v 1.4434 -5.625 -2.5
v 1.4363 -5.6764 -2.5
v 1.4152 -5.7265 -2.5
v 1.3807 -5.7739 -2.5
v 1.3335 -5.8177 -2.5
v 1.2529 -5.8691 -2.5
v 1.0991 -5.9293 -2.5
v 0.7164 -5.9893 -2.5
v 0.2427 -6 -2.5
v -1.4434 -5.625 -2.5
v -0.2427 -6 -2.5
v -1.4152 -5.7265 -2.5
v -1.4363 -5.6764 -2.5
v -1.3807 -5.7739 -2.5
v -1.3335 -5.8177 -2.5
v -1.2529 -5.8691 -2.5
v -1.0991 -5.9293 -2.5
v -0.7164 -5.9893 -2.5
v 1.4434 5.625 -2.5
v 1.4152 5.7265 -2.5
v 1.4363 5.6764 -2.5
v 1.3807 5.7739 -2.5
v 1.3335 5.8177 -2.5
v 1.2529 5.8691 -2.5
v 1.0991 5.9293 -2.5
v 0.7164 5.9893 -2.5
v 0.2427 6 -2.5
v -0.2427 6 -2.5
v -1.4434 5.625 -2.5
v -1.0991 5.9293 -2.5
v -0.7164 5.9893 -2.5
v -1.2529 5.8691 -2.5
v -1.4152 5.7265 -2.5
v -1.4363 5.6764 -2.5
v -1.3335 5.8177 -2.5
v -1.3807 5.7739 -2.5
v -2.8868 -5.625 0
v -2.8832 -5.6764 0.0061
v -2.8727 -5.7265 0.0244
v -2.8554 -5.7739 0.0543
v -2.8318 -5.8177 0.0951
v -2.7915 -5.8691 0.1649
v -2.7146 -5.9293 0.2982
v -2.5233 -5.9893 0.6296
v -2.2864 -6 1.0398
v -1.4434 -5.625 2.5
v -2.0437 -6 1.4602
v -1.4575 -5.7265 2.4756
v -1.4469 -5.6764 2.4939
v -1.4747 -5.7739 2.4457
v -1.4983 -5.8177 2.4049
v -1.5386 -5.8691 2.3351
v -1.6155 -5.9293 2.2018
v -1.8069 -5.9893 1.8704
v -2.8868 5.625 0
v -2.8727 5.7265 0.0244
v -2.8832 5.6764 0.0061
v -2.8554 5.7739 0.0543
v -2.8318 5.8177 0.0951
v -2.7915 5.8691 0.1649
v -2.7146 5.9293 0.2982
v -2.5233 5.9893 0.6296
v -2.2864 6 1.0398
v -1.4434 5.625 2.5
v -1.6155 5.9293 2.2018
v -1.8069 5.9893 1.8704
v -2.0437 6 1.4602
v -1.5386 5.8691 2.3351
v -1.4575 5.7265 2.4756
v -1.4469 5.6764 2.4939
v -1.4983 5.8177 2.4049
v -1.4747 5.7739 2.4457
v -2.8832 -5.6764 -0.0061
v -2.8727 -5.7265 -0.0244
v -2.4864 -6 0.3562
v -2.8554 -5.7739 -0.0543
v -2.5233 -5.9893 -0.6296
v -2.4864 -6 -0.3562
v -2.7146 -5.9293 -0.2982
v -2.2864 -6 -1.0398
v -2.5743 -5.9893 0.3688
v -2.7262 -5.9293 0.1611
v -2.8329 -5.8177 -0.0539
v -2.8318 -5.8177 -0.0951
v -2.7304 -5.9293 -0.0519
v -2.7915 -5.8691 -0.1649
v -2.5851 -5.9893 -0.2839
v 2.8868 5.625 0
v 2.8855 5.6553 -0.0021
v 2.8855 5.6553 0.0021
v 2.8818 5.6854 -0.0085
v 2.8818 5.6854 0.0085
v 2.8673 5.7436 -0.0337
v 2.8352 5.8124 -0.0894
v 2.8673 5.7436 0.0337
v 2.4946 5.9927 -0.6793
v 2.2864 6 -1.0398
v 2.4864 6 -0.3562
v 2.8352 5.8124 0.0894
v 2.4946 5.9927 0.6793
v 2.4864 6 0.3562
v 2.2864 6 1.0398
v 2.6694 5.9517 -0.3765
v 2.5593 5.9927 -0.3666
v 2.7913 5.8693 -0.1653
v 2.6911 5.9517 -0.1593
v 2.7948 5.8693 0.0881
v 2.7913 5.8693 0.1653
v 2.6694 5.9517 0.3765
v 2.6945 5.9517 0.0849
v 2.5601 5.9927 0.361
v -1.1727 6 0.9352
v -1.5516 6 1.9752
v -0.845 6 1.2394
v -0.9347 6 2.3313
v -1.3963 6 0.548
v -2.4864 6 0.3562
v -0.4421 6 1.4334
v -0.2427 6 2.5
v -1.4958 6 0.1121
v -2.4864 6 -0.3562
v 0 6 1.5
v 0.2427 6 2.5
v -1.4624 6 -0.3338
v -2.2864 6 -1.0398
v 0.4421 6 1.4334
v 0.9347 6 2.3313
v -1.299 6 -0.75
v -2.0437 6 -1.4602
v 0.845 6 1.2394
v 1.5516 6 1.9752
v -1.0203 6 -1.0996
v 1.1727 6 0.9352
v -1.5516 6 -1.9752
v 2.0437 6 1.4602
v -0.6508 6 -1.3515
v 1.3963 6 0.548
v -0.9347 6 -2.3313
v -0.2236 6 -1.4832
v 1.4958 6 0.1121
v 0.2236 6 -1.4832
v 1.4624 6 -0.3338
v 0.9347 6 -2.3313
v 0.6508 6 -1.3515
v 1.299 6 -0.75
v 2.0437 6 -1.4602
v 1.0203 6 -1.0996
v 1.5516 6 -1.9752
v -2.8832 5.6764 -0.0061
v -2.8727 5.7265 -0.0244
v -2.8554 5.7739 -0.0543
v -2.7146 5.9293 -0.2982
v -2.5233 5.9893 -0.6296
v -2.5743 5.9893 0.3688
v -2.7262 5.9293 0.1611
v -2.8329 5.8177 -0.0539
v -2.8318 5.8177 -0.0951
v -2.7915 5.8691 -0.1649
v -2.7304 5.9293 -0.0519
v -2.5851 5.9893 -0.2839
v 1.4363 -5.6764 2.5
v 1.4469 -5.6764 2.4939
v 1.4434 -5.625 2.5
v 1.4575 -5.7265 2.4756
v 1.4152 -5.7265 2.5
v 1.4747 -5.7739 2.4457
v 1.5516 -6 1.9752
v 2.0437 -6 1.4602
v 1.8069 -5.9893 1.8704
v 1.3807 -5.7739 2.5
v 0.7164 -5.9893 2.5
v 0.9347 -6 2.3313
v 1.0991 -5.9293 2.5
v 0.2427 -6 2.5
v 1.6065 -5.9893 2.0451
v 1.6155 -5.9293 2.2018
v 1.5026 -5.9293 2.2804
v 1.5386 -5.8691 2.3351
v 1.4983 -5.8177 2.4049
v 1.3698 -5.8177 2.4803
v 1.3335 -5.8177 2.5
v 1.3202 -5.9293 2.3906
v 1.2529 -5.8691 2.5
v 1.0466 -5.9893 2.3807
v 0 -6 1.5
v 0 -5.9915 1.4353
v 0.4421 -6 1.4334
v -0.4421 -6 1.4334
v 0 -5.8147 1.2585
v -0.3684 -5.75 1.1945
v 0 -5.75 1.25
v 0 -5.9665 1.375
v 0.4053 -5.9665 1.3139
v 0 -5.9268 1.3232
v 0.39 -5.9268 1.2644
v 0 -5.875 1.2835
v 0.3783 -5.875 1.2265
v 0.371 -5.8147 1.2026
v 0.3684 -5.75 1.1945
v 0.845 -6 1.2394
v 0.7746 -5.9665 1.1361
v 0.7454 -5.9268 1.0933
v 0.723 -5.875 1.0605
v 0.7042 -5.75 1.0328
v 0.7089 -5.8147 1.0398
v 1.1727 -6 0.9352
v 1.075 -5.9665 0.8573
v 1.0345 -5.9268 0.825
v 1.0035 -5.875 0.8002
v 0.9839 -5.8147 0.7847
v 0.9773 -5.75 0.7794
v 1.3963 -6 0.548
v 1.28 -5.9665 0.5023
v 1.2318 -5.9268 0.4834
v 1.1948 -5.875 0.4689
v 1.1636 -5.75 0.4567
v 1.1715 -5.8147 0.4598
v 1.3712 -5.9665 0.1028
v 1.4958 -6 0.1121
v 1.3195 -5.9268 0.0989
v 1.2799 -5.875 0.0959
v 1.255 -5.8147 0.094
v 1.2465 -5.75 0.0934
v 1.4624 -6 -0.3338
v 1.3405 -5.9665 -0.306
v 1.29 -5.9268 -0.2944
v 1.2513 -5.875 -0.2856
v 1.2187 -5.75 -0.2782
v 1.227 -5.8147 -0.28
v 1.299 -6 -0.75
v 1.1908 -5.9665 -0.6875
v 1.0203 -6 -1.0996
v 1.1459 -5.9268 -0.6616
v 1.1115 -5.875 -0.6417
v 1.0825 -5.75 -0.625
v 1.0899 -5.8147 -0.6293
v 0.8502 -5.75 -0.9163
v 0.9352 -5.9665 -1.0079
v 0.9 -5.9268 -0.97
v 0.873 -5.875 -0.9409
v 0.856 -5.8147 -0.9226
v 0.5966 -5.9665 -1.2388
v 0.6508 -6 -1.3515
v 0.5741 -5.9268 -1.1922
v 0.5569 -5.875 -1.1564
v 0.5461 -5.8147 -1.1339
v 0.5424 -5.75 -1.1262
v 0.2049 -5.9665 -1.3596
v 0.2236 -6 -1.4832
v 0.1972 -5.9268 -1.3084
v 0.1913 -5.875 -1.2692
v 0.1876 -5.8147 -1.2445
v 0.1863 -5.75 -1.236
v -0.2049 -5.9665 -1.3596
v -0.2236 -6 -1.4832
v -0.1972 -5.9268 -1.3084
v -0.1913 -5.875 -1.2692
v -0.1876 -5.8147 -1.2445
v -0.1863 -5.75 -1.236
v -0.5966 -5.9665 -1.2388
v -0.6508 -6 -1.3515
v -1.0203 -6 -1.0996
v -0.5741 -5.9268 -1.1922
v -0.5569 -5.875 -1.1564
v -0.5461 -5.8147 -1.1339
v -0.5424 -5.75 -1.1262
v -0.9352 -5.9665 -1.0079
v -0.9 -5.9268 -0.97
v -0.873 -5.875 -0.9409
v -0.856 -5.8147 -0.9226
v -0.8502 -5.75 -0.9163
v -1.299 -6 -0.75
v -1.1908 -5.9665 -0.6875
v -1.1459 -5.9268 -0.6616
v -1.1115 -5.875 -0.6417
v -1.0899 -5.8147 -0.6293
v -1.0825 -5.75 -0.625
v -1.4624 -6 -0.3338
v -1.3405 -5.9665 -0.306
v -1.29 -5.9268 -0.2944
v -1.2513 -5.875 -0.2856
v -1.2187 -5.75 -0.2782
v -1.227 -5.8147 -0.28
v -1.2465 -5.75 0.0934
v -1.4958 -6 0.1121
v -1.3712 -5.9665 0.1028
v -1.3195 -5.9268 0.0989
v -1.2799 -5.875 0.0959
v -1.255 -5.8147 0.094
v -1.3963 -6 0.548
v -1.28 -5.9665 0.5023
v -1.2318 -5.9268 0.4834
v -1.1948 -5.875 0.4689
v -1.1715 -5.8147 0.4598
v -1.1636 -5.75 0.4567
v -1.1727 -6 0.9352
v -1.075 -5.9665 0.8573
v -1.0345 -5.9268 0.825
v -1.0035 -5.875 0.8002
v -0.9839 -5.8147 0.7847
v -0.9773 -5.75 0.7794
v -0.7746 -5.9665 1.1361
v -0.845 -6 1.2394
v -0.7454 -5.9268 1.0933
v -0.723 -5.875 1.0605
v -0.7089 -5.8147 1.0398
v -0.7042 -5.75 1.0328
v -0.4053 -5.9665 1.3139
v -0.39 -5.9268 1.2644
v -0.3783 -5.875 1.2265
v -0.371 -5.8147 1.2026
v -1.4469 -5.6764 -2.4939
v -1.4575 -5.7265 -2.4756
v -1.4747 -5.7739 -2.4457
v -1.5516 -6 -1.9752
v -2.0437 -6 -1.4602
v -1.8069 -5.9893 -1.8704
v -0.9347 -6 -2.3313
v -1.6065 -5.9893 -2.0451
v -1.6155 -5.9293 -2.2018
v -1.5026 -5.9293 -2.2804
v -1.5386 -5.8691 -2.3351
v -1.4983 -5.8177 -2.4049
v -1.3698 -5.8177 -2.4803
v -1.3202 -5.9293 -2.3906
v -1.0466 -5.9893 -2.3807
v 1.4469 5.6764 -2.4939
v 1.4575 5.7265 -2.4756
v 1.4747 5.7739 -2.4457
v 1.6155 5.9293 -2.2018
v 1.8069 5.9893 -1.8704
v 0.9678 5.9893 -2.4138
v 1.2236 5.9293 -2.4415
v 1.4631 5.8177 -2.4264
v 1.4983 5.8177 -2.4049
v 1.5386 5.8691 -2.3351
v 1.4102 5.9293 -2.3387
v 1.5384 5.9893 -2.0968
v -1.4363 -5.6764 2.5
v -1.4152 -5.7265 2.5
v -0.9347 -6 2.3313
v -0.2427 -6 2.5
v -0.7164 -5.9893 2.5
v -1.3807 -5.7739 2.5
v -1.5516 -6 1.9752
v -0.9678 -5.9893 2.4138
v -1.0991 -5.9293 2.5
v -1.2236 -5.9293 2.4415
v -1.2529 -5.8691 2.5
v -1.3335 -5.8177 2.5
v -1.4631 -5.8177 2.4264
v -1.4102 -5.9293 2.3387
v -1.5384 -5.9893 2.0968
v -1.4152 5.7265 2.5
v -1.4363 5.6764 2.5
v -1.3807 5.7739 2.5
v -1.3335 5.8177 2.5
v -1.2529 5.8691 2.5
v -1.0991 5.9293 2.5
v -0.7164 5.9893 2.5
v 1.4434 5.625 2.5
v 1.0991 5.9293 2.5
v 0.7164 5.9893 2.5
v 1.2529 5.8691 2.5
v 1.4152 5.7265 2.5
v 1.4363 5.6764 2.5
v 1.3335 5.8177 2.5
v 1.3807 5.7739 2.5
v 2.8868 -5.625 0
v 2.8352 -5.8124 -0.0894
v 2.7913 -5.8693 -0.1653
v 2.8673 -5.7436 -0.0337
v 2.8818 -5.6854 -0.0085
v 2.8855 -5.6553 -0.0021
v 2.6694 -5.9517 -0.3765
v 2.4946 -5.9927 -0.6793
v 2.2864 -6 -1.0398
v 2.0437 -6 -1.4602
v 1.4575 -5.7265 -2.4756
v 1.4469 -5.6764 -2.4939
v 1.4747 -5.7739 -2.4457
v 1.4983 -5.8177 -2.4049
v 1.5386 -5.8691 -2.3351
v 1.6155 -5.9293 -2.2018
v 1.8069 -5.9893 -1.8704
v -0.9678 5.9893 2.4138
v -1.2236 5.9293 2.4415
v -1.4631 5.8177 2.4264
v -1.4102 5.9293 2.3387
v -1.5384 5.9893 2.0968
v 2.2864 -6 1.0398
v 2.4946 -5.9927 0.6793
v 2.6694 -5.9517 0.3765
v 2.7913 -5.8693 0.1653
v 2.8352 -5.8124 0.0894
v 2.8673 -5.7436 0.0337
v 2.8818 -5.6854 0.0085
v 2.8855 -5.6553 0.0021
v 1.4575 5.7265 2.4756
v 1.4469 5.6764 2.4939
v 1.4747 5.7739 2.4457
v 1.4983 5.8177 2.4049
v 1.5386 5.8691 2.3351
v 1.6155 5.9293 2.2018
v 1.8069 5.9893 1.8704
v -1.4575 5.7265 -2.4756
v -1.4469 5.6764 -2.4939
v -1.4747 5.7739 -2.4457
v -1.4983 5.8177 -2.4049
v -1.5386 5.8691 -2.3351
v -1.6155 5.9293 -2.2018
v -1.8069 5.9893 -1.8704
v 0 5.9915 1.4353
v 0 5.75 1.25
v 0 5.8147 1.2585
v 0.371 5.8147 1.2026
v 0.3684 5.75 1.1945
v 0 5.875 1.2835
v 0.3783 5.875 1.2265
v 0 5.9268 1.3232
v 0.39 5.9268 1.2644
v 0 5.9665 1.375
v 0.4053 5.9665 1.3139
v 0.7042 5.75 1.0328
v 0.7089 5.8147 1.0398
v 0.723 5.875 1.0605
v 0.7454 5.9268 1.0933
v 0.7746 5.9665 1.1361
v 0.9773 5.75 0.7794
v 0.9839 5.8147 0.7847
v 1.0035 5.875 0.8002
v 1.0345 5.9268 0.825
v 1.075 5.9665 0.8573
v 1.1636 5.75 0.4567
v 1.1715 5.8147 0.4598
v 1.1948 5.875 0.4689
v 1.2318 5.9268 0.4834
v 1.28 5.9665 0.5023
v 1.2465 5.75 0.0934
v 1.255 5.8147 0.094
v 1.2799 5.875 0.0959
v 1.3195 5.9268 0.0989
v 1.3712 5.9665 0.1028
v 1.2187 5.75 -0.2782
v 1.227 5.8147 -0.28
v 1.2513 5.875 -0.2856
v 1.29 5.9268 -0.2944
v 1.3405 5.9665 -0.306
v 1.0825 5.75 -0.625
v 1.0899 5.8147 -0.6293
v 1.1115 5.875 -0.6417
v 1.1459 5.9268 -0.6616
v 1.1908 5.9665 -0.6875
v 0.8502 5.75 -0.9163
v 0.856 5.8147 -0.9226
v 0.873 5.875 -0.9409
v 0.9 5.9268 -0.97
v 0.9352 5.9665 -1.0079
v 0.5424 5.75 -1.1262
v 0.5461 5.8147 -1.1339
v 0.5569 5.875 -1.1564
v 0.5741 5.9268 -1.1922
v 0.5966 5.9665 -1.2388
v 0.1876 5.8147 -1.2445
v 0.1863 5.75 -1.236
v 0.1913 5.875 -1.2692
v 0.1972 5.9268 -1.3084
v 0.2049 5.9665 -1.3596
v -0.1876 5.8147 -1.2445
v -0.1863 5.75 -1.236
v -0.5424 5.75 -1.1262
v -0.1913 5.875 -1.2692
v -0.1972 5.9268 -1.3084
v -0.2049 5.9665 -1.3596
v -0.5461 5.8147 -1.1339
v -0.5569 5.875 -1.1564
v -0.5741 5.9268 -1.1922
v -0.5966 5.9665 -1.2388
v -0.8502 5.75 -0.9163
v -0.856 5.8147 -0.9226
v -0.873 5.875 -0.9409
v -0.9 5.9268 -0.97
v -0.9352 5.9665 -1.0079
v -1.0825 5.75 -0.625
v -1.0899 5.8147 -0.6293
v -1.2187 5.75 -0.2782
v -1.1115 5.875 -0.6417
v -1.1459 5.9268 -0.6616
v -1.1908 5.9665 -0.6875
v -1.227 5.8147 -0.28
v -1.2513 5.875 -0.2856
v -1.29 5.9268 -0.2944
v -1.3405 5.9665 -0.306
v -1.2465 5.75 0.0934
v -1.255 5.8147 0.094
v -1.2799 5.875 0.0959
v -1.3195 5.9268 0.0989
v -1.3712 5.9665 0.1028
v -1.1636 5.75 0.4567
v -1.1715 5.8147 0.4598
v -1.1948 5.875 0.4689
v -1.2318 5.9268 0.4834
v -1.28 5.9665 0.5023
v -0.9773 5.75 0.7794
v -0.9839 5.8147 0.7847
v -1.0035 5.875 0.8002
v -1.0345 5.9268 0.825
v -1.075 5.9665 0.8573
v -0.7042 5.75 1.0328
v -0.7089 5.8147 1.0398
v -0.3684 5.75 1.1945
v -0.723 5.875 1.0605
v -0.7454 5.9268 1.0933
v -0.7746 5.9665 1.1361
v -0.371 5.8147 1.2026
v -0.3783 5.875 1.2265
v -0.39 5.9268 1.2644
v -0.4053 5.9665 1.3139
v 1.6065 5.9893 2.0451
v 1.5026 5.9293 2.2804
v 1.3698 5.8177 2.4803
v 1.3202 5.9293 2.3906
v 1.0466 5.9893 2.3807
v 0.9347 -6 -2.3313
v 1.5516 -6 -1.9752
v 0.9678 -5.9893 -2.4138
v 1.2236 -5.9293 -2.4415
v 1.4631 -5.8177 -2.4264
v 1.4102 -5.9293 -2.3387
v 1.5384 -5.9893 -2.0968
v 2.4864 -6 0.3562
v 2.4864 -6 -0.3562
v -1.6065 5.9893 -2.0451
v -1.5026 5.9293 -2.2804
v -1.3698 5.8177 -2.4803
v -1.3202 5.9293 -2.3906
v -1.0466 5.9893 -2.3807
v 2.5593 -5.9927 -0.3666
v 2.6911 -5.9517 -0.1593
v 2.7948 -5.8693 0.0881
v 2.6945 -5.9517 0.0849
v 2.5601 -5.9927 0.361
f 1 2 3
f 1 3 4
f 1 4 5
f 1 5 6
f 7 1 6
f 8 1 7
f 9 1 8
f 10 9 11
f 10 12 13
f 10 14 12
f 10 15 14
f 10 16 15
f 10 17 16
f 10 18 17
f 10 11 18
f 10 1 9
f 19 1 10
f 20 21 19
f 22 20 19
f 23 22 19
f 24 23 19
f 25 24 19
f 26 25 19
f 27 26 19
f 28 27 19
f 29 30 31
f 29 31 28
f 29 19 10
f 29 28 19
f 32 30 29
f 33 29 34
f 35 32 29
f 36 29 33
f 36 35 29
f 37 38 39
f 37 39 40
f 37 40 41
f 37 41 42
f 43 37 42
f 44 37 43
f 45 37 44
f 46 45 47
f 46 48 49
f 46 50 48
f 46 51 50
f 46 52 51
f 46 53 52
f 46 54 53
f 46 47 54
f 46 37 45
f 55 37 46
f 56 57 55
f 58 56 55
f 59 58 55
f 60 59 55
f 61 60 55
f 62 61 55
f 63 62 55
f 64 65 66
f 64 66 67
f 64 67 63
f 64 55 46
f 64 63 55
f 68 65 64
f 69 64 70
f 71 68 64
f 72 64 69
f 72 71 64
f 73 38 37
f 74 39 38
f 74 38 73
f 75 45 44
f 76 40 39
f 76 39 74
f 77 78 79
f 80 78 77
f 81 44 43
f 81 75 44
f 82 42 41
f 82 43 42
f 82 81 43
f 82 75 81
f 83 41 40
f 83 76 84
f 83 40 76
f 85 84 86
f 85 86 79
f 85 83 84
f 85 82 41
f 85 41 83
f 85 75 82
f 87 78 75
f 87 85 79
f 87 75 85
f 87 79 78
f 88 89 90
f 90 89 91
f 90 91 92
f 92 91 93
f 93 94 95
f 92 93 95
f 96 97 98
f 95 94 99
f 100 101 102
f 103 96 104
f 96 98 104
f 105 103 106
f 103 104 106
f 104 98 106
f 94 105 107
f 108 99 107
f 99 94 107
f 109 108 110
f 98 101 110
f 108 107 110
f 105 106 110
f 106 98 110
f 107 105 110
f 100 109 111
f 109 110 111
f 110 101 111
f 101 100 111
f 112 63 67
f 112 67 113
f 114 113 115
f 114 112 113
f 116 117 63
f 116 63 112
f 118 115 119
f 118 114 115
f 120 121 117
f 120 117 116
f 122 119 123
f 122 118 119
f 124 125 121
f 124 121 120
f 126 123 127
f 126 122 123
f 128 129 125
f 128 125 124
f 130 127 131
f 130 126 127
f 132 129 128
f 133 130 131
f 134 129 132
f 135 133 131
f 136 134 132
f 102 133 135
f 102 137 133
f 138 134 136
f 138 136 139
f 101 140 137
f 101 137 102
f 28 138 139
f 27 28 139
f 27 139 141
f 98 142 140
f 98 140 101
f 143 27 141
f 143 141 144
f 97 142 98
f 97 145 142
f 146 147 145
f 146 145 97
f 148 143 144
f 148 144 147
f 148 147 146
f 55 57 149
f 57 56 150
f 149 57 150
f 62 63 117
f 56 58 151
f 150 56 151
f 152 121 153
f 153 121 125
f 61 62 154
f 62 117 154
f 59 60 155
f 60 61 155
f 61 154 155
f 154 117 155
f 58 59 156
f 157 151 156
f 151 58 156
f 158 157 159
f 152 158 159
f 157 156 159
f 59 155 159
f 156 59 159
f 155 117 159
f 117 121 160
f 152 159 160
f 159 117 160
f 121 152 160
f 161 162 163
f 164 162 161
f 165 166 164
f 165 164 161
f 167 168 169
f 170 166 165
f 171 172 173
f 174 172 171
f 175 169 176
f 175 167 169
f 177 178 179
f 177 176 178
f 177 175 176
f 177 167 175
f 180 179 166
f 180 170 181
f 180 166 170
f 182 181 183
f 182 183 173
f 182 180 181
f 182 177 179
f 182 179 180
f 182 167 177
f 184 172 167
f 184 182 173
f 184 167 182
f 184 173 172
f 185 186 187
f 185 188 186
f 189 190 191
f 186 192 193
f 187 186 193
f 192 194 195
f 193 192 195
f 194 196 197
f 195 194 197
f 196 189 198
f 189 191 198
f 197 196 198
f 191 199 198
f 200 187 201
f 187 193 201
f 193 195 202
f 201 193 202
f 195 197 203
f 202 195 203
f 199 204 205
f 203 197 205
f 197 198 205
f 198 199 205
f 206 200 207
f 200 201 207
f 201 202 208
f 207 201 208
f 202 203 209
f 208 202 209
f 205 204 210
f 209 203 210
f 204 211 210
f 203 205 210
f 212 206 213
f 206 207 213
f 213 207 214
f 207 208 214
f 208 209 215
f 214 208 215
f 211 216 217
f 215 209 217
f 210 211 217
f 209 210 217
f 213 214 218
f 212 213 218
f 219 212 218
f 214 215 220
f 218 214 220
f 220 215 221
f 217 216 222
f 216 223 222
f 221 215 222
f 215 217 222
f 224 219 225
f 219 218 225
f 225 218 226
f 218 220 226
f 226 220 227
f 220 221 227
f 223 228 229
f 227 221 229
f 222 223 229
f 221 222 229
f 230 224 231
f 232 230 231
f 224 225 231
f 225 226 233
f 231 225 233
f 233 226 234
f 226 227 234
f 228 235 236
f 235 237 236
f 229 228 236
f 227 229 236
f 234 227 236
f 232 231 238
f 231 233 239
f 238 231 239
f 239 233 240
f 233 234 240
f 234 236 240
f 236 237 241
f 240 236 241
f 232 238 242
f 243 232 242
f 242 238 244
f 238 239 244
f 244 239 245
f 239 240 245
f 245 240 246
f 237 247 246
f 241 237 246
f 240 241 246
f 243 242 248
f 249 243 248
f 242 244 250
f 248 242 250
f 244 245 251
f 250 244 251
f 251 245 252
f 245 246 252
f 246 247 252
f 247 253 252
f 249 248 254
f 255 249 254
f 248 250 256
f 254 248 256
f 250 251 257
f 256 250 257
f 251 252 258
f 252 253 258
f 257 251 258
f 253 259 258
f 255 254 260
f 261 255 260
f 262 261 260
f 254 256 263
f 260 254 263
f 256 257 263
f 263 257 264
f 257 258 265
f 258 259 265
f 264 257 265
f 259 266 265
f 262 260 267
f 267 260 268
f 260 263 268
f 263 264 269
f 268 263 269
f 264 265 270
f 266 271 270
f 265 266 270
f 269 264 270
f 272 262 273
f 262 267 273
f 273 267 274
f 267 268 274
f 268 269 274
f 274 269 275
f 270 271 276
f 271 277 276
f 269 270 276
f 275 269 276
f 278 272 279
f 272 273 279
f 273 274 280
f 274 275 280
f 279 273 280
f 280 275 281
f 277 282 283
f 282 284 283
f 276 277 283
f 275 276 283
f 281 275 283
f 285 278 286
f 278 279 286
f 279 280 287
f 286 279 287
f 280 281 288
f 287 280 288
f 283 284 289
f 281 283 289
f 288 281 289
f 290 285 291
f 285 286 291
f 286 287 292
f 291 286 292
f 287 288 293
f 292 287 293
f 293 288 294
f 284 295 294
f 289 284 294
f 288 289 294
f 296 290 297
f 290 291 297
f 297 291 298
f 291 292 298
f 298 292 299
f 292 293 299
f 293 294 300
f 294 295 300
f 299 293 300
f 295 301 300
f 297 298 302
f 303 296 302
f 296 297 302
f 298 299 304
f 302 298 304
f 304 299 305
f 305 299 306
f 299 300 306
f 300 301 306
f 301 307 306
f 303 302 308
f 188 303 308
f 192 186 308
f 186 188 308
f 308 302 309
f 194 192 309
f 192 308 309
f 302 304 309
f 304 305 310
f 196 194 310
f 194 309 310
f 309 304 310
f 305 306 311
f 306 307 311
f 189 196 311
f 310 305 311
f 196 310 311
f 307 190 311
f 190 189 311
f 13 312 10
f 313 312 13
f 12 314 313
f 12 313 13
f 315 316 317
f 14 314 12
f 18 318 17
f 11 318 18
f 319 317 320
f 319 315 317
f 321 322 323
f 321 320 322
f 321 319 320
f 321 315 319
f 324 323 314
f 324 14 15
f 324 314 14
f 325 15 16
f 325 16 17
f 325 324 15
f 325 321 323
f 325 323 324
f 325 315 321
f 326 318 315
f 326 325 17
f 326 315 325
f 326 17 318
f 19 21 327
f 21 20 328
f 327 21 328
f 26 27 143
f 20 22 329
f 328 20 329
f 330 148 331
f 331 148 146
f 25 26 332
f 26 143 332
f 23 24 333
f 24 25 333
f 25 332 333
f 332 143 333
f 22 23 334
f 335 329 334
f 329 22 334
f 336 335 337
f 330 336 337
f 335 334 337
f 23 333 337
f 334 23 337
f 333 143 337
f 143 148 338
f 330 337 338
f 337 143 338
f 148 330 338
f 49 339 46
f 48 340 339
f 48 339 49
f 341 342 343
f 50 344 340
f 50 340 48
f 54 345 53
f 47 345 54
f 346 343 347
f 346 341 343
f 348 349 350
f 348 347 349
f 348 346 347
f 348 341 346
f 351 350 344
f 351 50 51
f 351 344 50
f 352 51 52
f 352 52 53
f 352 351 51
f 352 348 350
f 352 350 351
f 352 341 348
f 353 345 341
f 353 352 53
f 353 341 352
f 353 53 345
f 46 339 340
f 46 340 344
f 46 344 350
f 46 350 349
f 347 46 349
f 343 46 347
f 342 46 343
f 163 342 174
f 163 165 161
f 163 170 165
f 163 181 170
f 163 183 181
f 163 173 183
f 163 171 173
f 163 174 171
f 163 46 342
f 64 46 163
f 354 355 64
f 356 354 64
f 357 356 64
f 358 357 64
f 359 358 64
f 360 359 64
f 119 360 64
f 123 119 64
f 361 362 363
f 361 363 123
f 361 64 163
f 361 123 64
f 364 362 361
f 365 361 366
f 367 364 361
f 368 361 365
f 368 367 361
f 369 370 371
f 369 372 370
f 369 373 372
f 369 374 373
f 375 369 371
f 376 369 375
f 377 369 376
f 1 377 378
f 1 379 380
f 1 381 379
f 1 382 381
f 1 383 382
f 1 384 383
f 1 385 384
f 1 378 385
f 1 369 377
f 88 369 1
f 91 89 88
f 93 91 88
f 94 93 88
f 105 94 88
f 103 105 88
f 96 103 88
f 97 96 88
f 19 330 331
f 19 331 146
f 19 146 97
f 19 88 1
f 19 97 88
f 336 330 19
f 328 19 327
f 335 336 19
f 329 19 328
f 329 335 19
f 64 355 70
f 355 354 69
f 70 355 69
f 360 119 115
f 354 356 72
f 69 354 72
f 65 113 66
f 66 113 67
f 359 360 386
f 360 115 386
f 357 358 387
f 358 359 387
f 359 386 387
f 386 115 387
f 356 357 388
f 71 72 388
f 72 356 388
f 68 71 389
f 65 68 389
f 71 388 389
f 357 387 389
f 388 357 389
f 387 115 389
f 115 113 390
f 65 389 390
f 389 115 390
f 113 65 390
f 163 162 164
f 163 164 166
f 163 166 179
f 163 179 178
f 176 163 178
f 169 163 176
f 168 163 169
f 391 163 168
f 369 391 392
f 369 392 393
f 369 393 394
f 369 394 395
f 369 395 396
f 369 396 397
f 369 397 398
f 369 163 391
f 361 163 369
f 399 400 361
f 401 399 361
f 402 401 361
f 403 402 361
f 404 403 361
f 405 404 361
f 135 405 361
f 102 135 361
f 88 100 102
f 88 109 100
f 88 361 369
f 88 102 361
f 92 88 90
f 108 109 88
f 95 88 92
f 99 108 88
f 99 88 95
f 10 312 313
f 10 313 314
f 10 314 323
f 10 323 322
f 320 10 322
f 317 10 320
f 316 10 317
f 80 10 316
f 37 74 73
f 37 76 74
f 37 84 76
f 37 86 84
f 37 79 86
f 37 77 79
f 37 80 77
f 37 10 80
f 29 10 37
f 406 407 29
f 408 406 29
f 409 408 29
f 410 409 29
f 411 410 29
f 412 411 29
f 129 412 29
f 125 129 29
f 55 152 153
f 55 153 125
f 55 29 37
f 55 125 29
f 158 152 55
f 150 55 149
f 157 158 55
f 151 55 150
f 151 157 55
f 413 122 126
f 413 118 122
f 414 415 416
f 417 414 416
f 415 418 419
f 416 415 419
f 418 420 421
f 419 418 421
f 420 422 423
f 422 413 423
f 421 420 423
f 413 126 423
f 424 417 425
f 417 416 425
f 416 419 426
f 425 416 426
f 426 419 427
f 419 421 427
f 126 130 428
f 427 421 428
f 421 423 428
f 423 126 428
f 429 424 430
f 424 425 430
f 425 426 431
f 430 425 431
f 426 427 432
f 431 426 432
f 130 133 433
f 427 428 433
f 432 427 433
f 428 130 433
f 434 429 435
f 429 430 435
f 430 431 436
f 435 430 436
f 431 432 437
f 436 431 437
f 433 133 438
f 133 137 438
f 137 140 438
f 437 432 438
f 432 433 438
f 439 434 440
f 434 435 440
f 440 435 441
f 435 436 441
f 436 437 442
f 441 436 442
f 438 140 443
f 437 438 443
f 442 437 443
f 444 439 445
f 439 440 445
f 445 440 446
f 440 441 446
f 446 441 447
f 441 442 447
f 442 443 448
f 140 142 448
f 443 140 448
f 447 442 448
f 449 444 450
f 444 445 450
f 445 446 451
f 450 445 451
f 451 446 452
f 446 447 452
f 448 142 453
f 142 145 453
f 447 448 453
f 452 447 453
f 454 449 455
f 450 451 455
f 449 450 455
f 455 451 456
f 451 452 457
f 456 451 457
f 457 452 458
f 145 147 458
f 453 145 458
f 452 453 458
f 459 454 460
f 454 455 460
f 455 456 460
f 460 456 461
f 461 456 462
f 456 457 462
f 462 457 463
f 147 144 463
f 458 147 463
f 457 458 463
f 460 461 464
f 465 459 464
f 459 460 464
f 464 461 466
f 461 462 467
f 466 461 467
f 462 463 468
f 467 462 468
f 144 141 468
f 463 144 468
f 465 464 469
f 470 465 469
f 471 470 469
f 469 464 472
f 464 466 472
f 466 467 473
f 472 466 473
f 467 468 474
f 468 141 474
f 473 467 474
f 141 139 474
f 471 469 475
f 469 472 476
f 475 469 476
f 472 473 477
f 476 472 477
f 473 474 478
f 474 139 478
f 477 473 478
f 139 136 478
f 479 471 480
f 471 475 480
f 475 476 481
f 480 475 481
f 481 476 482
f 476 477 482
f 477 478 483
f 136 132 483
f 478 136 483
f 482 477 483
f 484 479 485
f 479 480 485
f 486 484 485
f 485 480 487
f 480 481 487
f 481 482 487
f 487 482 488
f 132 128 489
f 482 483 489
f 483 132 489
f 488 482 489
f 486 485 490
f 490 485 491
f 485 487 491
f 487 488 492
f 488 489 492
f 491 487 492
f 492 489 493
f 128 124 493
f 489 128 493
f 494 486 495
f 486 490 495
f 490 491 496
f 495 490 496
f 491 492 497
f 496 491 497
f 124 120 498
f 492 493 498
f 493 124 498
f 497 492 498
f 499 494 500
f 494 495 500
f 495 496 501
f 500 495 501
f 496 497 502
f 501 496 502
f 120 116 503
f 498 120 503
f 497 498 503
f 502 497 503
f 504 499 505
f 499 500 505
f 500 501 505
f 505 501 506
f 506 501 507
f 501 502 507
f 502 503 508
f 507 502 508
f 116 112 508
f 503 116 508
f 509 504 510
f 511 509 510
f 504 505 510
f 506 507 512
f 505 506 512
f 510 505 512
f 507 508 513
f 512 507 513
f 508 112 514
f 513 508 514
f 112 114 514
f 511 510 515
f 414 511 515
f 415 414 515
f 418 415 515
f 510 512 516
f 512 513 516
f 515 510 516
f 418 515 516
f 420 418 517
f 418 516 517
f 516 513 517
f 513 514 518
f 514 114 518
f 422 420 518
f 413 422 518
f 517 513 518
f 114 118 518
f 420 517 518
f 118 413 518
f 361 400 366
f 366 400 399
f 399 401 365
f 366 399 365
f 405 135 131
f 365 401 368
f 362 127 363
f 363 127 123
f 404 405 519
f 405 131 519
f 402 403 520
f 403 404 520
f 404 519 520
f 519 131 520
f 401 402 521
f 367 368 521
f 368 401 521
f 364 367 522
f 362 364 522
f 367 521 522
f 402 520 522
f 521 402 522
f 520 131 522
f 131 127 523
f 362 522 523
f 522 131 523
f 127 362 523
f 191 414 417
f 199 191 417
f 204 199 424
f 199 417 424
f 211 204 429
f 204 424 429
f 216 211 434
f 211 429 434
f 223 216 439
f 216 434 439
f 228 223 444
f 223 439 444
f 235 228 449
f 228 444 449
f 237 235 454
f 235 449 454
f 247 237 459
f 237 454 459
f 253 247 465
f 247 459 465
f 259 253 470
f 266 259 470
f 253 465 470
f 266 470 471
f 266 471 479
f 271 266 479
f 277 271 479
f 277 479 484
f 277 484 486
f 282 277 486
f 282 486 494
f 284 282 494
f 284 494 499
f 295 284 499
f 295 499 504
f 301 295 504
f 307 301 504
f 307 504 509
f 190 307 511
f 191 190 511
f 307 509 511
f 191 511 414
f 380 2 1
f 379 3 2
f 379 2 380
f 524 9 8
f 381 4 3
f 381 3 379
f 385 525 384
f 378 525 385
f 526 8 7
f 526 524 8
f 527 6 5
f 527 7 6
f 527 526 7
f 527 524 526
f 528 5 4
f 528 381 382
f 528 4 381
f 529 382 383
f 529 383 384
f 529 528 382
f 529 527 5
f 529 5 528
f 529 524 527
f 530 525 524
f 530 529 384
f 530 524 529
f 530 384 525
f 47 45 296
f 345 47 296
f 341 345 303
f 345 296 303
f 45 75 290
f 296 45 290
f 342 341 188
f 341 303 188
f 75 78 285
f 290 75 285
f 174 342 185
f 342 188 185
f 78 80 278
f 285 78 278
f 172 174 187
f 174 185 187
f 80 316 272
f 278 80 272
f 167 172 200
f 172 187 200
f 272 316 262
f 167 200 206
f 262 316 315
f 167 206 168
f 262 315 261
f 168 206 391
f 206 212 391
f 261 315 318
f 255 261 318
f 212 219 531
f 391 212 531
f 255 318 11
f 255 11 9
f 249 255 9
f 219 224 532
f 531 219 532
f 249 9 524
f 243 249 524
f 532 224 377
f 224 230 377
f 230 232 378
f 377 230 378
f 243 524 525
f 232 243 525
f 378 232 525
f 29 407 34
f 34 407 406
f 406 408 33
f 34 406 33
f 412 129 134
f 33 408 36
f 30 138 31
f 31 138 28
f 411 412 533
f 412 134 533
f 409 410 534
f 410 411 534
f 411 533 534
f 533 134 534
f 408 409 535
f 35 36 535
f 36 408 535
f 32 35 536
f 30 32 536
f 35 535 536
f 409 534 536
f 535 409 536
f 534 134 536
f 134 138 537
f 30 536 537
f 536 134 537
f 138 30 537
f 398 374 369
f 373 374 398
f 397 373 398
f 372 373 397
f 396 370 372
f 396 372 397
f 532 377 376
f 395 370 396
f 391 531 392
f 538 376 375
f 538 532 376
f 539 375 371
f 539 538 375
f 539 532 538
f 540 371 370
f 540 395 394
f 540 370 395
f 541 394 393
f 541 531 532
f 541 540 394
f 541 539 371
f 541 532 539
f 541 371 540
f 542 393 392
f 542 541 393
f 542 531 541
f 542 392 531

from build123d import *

# Parameters (mm, degrees)
BOSS_EXTRUDE1_DEPTH = 6
SKETCH2_R           = 1.25
CUT_EXTRUDE1_DEPTH  = 12
FILLET1_R           = 0.25


with BuildPart() as part:
    # Sketch1 → Boss-Extrude1 (new, symmetric)
    with BuildSketch(Plane(origin=(0, 0, 0), x_dir=(1, 0, 0), z_dir=(0, 1, 0))):
        Polygon((-2.886751346, 0), (-1.443375673, -2.5), (1.443375673, -2.5), (2.886751346, 0), (1.443375673, 2.5), (-1.443375673, 2.5), align=None)
    extrude(amount=BOSS_EXTRUDE1_DEPTH, both=True)

    # Sketch2 → Cut-Extrude1 (cut)
    with BuildSketch(Plane(origin=(0, 6, 0), x_dir=(1, 0, 0), z_dir=(0, 1, 0))):
        with Locations(Location((0, 0, 0), (0, 0, 270))):
            Circle(SKETCH2_R)
    extrude(amount=-CUT_EXTRUDE1_DEPTH, mode=Mode.SUBTRACT)

    # Sketch3 → Cut-Revolve1 (revolve, cut)
    with BuildSketch(Plane.XY):
        with BuildLine():
            Line((2.511751346, 6), (2.886751346, 6))
            Line((2.886751346, 6), (2.886751346, 5.625))
            ThreePointArc((2.886751346, 5.625), (2.776916389, 5.890165043), (2.511751346, 6))
        make_face()
        with BuildLine():
            Line((2.886751346, -6), (2.886751346, -5.625))
            ThreePointArc((2.886751346, -5.625), (2.776916389, -5.890165043), (2.511751346, -6))
            Line((2.511751346, -6), (2.886751346, -6))
        make_face()
    revolve(axis=Axis((0, 5.721589011, 0), (0, -1, 0)), mode=Mode.SUBTRACT)

    # Fillet1
    fillet1_edges = [part.edges().sort_by_distance(p)[0] for p in [
        (0, 6, -1.25),
        (0, -6, -1.25),
    ]]
    fillet(fillet1_edges, radius=FILLET1_R)


solid = part.part
